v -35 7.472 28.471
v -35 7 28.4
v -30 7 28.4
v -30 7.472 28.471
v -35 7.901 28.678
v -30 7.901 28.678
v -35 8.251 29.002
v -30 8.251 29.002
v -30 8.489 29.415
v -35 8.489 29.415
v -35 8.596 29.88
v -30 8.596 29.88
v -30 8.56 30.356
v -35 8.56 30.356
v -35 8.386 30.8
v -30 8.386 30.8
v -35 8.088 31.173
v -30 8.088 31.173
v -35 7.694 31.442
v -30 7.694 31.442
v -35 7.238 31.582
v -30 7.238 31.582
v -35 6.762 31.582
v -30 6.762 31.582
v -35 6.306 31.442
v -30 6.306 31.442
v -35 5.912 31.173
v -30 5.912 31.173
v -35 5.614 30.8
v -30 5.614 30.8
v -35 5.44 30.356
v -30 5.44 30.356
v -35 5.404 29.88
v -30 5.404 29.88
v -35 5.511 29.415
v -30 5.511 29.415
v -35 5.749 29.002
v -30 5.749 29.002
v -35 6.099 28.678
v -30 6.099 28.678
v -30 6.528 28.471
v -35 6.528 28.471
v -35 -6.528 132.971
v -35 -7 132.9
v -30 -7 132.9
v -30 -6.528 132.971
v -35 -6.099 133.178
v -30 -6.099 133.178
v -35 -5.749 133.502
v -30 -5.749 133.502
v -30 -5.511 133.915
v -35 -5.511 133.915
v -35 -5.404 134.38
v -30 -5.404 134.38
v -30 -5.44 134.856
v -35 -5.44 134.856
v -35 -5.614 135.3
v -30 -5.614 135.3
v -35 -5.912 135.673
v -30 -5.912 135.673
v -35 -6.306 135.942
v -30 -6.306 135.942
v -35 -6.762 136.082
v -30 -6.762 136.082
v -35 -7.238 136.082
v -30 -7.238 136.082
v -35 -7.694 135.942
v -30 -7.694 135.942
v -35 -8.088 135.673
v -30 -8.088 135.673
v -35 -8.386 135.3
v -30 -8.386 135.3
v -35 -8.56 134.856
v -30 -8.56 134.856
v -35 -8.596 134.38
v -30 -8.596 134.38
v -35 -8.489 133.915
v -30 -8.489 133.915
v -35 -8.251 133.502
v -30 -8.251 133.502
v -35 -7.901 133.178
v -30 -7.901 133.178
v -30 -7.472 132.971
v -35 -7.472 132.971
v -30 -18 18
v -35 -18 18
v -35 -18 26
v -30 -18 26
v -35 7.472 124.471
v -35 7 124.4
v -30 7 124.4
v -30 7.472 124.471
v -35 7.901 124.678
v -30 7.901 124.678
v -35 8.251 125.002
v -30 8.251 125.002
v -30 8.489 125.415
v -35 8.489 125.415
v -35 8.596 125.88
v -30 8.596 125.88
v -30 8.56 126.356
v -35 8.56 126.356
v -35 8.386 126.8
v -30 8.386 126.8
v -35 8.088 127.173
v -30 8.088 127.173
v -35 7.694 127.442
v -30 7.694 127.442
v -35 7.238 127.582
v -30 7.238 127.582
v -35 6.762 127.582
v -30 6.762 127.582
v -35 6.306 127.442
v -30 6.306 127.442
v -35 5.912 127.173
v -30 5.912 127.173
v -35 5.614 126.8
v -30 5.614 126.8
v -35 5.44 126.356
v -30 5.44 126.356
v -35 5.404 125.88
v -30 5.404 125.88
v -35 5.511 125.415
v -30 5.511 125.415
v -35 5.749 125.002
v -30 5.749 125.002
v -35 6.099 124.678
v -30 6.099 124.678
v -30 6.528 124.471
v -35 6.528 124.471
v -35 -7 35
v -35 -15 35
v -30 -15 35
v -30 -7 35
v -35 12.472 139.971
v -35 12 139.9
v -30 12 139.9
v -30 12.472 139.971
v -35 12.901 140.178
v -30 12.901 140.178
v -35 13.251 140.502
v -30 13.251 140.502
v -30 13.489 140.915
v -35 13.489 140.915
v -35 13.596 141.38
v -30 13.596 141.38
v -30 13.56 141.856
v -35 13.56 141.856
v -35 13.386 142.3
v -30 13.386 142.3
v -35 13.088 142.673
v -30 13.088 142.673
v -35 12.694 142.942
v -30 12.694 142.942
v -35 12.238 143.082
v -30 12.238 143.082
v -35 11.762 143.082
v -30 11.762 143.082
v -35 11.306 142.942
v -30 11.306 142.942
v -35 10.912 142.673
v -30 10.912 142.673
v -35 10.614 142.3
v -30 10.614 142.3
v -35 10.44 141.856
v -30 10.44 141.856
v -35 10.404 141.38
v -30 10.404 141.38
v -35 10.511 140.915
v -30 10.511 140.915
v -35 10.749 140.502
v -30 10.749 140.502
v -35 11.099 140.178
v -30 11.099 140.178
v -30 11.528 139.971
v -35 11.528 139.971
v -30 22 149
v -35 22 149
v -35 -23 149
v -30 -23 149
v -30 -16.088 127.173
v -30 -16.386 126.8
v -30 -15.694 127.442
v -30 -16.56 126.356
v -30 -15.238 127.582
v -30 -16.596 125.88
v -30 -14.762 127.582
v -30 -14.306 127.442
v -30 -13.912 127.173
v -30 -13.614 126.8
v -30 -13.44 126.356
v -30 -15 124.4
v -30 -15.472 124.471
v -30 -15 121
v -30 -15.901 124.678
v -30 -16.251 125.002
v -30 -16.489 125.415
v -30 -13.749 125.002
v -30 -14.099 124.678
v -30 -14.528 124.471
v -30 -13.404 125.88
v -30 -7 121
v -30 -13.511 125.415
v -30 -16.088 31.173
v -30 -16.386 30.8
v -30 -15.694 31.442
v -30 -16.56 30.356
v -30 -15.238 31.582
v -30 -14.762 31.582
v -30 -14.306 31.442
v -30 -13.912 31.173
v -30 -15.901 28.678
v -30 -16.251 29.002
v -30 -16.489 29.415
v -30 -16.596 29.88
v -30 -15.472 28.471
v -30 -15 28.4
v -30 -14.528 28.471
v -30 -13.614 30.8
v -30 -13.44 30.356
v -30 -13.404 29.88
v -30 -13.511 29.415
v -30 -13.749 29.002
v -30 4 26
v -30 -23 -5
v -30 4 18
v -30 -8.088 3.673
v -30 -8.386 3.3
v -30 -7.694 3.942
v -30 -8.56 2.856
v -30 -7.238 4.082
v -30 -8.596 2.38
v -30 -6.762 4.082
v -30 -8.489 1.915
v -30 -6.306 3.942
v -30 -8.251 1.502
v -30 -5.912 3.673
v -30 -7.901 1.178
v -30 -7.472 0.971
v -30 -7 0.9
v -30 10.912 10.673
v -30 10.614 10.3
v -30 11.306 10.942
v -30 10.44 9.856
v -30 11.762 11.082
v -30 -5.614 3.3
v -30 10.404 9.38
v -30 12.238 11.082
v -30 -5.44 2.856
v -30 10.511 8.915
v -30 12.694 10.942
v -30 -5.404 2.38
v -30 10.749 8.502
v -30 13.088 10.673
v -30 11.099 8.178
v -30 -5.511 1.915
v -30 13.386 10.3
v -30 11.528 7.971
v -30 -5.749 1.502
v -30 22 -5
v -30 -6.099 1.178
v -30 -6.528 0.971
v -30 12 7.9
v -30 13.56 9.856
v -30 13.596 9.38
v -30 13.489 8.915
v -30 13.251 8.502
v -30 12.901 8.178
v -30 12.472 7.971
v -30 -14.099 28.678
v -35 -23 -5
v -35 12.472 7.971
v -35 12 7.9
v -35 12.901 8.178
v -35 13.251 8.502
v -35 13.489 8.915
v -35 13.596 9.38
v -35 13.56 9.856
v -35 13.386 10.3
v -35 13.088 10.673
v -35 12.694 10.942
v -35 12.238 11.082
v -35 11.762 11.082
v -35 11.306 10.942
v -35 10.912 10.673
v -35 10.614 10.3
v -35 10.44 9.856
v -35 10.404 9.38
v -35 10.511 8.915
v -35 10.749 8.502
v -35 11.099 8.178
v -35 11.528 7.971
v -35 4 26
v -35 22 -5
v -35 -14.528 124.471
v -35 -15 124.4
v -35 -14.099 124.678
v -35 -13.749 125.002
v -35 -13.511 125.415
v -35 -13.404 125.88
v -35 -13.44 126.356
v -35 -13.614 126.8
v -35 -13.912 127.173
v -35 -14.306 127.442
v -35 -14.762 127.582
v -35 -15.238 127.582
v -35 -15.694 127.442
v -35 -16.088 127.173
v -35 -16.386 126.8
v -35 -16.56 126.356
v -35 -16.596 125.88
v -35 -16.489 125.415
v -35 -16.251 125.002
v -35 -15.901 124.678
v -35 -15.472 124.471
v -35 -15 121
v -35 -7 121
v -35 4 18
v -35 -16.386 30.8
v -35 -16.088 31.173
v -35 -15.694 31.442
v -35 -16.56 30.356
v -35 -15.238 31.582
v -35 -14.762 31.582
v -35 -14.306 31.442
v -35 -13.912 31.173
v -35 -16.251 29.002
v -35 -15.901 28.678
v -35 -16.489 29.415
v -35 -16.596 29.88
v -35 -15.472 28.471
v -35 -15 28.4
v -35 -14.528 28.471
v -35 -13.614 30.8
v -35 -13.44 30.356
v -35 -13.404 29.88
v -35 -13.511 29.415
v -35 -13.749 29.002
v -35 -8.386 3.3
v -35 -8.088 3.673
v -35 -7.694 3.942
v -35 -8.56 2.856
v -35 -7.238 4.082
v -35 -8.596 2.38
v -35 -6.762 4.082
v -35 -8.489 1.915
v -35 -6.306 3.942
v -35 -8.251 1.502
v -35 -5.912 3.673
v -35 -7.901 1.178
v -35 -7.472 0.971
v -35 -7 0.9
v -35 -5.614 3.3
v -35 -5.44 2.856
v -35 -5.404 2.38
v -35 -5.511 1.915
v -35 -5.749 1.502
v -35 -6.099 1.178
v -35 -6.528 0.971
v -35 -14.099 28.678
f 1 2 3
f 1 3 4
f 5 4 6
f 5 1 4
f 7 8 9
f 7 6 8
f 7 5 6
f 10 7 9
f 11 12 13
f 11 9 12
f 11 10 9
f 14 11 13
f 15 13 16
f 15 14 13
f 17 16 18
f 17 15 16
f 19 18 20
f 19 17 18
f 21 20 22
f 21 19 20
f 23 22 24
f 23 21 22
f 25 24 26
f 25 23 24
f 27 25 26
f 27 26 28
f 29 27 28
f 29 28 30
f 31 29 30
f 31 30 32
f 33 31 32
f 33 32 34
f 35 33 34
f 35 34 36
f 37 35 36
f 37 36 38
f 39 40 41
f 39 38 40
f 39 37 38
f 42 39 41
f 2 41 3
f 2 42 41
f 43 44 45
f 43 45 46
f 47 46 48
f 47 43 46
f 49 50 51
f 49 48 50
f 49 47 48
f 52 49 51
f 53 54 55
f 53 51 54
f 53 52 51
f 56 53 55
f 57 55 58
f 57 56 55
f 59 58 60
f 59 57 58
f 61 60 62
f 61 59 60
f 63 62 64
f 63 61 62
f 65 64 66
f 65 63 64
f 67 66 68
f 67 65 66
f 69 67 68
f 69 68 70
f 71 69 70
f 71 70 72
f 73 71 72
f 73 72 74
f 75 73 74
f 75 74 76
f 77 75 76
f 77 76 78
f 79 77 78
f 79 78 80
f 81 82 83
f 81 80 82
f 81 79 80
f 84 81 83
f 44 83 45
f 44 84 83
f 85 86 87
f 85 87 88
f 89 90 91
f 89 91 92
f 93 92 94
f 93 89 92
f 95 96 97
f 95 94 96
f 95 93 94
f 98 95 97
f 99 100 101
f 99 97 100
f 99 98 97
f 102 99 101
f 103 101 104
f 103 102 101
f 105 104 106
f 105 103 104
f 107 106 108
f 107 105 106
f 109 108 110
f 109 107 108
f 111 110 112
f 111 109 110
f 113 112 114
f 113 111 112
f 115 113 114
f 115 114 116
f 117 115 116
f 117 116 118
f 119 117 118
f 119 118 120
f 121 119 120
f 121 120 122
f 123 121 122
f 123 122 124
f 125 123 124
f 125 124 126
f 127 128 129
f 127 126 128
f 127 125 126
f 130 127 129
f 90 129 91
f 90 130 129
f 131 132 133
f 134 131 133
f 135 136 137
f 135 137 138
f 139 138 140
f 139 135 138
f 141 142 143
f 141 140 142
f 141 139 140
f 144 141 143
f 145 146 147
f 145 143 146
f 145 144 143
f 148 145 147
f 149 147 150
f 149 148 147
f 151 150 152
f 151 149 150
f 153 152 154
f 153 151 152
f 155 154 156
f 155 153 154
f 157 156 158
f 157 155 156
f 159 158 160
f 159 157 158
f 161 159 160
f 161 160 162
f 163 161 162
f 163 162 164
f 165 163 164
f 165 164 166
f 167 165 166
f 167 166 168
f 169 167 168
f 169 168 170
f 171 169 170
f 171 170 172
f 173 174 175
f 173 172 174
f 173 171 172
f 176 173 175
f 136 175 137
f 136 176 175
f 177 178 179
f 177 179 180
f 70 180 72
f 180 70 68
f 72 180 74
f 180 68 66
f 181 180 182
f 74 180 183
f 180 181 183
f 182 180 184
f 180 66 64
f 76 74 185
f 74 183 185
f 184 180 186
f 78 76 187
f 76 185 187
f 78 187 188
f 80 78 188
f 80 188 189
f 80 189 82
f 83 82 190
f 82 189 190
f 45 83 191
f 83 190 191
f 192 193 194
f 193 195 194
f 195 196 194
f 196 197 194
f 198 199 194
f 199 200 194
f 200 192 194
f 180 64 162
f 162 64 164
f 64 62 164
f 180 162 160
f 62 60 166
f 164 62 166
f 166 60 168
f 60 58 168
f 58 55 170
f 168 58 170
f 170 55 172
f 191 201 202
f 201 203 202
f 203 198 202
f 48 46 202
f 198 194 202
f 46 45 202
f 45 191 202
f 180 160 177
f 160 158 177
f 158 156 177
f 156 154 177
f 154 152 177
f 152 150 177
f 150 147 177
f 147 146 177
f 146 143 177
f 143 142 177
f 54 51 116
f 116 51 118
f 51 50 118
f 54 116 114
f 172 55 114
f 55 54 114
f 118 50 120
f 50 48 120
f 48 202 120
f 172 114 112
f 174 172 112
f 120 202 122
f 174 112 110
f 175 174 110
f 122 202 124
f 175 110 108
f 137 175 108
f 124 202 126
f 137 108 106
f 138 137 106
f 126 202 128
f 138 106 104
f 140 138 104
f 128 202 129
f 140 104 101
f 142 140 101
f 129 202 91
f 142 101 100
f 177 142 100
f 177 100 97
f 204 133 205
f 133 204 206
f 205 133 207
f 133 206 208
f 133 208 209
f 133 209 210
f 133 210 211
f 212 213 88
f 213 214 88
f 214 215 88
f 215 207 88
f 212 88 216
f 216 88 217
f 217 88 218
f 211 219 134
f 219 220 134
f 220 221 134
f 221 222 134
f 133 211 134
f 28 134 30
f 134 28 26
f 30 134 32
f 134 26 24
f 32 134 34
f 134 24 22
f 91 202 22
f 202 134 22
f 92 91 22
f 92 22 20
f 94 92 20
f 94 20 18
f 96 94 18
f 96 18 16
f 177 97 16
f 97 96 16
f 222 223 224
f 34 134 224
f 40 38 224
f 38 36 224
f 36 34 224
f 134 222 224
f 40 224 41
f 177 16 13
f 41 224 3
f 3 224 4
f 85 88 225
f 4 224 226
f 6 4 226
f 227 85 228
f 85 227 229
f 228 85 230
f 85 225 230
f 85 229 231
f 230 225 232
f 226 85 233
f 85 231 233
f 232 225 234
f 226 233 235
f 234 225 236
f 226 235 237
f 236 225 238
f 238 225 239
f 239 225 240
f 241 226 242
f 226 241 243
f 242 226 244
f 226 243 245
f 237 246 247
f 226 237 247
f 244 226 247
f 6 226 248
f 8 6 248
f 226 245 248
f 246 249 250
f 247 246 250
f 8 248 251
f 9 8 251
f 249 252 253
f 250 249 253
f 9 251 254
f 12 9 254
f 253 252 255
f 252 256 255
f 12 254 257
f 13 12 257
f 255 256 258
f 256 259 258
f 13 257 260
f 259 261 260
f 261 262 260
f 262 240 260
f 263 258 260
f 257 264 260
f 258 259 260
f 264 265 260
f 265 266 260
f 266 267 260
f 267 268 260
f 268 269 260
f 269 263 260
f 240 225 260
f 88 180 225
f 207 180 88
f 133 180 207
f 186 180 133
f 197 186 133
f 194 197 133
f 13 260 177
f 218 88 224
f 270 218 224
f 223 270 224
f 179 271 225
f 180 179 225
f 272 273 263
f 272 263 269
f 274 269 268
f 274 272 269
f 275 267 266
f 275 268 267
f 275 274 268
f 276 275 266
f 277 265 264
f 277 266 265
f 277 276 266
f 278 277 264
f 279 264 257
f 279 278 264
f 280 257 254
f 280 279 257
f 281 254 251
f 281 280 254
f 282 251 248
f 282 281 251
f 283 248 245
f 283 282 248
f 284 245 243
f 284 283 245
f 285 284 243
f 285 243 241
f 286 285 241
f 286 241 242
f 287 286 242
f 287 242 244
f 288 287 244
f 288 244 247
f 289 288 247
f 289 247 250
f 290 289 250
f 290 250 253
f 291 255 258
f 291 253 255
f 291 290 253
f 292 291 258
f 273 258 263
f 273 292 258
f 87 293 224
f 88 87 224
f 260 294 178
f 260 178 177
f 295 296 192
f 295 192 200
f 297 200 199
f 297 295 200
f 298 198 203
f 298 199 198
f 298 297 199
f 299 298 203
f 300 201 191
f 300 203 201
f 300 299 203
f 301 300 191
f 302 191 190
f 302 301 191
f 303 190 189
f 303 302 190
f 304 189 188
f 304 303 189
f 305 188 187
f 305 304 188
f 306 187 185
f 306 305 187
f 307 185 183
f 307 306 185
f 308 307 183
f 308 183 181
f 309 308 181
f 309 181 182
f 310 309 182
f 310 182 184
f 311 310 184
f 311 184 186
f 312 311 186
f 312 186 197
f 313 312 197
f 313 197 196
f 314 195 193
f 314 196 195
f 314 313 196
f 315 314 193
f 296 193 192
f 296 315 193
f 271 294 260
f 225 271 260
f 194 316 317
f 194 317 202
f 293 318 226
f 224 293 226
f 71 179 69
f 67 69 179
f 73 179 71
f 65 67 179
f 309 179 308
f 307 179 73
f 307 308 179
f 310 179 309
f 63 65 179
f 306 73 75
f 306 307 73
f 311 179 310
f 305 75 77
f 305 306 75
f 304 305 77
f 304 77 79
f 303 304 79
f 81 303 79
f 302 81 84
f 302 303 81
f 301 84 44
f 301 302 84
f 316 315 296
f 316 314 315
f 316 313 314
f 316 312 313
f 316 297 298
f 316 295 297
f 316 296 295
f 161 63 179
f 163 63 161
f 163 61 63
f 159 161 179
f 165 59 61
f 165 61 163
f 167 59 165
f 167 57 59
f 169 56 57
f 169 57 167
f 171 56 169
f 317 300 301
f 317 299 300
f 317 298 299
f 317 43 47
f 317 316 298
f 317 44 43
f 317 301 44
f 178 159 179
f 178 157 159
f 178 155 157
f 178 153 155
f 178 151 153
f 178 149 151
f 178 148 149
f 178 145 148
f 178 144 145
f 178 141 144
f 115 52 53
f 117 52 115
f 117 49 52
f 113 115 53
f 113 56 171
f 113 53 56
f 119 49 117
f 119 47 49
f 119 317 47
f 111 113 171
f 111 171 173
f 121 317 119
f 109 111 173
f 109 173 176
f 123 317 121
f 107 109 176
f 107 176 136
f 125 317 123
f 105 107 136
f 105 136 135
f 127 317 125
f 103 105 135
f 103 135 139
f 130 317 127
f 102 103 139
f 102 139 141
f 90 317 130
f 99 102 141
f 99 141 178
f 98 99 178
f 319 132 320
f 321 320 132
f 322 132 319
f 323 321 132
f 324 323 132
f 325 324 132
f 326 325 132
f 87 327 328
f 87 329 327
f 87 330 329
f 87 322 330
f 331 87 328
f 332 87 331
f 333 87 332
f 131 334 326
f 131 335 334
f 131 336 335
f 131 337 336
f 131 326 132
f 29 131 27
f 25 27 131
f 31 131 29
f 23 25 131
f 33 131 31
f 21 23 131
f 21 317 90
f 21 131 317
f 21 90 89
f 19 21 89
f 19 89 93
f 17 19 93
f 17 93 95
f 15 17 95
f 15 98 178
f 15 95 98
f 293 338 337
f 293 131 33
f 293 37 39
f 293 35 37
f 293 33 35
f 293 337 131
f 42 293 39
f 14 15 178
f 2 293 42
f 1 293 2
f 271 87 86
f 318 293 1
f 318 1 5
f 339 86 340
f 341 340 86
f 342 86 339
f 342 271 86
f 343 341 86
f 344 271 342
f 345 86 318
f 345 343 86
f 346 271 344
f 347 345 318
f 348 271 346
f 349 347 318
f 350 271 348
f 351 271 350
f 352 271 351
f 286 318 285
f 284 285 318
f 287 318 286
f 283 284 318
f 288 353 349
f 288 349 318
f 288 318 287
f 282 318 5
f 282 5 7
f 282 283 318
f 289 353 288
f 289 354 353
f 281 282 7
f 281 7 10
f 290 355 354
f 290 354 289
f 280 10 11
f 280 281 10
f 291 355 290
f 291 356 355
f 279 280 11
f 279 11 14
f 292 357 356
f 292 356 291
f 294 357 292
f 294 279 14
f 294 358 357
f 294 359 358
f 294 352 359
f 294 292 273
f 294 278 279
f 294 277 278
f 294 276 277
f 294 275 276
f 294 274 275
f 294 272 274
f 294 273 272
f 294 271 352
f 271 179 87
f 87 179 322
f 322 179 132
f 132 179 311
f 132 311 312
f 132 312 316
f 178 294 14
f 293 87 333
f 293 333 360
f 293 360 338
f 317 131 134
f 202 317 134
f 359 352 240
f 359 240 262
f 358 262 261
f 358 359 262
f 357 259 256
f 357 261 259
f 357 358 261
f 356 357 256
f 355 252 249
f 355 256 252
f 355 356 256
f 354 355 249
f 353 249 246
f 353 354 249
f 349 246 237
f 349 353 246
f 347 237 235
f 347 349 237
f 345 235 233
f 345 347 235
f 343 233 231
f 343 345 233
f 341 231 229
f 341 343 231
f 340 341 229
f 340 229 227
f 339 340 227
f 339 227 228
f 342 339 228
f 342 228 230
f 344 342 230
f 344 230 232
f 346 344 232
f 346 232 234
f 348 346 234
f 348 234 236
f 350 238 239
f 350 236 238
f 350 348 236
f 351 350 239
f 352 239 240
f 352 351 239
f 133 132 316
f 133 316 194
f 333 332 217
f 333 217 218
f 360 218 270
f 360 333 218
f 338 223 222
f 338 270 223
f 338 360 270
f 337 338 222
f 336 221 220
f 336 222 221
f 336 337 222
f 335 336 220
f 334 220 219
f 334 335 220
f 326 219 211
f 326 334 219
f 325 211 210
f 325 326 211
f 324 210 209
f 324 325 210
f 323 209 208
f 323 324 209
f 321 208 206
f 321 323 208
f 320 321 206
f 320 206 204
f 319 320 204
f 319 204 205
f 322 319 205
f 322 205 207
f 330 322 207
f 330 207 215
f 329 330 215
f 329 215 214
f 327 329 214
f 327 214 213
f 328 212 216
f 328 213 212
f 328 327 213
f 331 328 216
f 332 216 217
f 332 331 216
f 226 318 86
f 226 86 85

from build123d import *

# Parameters (mm, degrees)
CYLINDER081_R           = 1.6
CYLINDER081_DEPTH       = 40
CYLINDER081_PITCH_ANGLE = 90
CYLINDER077_R           = 1.6
CYLINDER077_DEPTH       = 40
CYLINDER077_PITCH_ANGLE = 90
CYLINDER076_R           = 1.6
CYLINDER076_DEPTH       = 40
CYLINDER076_PITCH_ANGLE = 90
CYLINDER080_R           = 1.6
CYLINDER080_DEPTH       = 40
CYLINDER080_PITCH_ANGLE = 90
CYLINDER079_R           = 1.6
CYLINDER079_DEPTH       = 40
CYLINDER079_PITCH_ANGLE = 90
CYLINDER078_R           = 1.6
CYLINDER078_DEPTH       = 40
CYLINDER078_PITCH_ANGLE = 90
BOX028_W                = 10
BOX028_H                = 22
BOX028_DEPTH            = 8
CYLINDER019_R           = 1.6
CYLINDER019_DEPTH       = 40
CYLINDER019_PITCH_ANGLE = 90
CYLINDER018_R           = 1.6
CYLINDER018_DEPTH       = 40
CYLINDER018_PITCH_ANGLE = 90
CYLINDER017_R           = 1.6
CYLINDER017_DEPTH       = 40
CYLINDER016_R           = 1.6
CYLINDER016_DEPTH       = 70
CYLINDER016_ROLL_ANGLE  = 90
CYLINDER015_R           = 1.6
CYLINDER015_DEPTH       = 40
BOX016_W                = 10
BOX016_H                = 8
BOX016_DEPTH            = 86
BOX014_W                = 5
BOX014_H                = 45
BOX014_DEPTH            = 154


with BuildPart() as cylinder359:
    # Cylinder081 → Cylinder081 (new body)
    with BuildSketch(Plane.XY):
        Circle(CYLINDER081_R)
    extrude(amount=CYLINDER081_DEPTH)


with BuildPart() as cylinder359_1:
    # Cylinder081 pitch: moved
    add(cylinder359.part.rotate(Axis((0, 0, 0), (0, 1, 0)), CYLINDER081_PITCH_ANGLE))


with BuildPart() as cylinder359_2:
    # Cylinder081 placement: moved
    add(cylinder359_1.part.moved(Location((-67, 7, 126))))


with BuildPart() as cylinder355:
    # Cylinder077 → Cylinder077 (new body)
    with BuildSketch(Plane.XY):
        Circle(CYLINDER077_R)
    extrude(amount=CYLINDER077_DEPTH)


with BuildPart() as cylinder355_1:
    # Cylinder077 pitch: moved
    add(cylinder355.part.rotate(Axis((0, 0, 0), (0, 1, 0)), CYLINDER077_PITCH_ANGLE))


with BuildPart() as cylinder355_2:
    # Cylinder077 placement: moved
    add(cylinder355_1.part.moved(Location((-67, -15, 30))))


with BuildPart() as rocker_screw_holes_d001:
    # Cylinder076 → Cylinder076 (new body)
    with BuildSketch(Plane.XY):
        Circle(CYLINDER076_R)
    extrude(amount=CYLINDER076_DEPTH)


with BuildPart() as rocker_screw_holes_d001_1:
    # Cylinder076 pitch: moved
    add(rocker_screw_holes_d001.part.rotate(Axis((0, 0, 0), (0, 1, 0)), CYLINDER076_PITCH_ANGLE))


with BuildPart() as rocker_screw_holes_d001_2:
    # Cylinder076 placement: moved
    add(rocker_screw_holes_d001_1.part.moved(Location((-87, -7, 30))))

    # Fusion051: union Cylinder355
    add(cylinder355_2.part)


with BuildPart() as rocker_screw_holes_d001_3:
    # Fusion051 placement: moved
    add(rocker_screw_holes_d001_2.part.moved(Location((0, 0, 96))))

    # Fusion054: union Cylinder359
    add(cylinder359_2.part)


with BuildPart() as cylinder358:
    # Cylinder080 → Cylinder080 (new body)
    with BuildSketch(Plane.XY):
        Circle(CYLINDER080_R)
    extrude(amount=CYLINDER080_DEPTH)


with BuildPart() as cylinder358_1:
    # Cylinder080 pitch: moved
    add(cylinder358.part.rotate(Axis((0, 0, 0), (0, 1, 0)), CYLINDER080_PITCH_ANGLE))


with BuildPart() as cylinder358_2:
    # Cylinder080 placement: moved
    add(cylinder358_1.part.moved(Location((-67, 7, 30))))


with BuildPart() as cylinder357:
    # Cylinder079 → Cylinder079 (new body)
    with BuildSketch(Plane.XY):
        Circle(CYLINDER079_R)
    extrude(amount=CYLINDER079_DEPTH)


with BuildPart() as cylinder357_1:
    # Cylinder079 pitch: moved
    add(cylinder357.part.rotate(Axis((0, 0, 0), (0, 1, 0)), CYLINDER079_PITCH_ANGLE))


with BuildPart() as cylinder357_2:
    # Cylinder079 placement: moved
    add(cylinder357_1.part.moved(Location((-67, -15, 30))))


with BuildPart() as rocker_screw_holes_c001:
    # Cylinder078 → Cylinder078 (new body)
    with BuildSketch(Plane.XY):
        Circle(CYLINDER078_R)
    extrude(amount=CYLINDER078_DEPTH)


with BuildPart() as rocker_screw_holes_c001_1:
    # Cylinder078 pitch: moved
    add(rocker_screw_holes_c001.part.rotate(Axis((0, 0, 0), (0, 1, 0)), CYLINDER078_PITCH_ANGLE))


with BuildPart() as rocker_screw_holes_c001_2:
    # Cylinder078 placement: moved
    add(rocker_screw_holes_c001_1.part.moved(Location((-87, -7, 30))))

    # Fusion052: union Cylinder357
    add(cylinder357_2.part)

    # Fusion053: union Cylinder358
    add(cylinder358_2.part)


with BuildPart() as cube016:
    # Box028 → Box028 (new body)
    with BuildSketch(Plane(origin=(-37, -18, 18), x_dir=(1, 0, 0), z_dir=(0, 0, 1))):
        with Locations((5, 11)):
            Rectangle(BOX028_W, BOX028_H)
    extrude(amount=BOX028_DEPTH)


with BuildPart() as cylinder100:
    # Cylinder019 → Cylinder019 (new body)
    with BuildSketch(Plane.XY):
        Circle(CYLINDER019_R)
    extrude(amount=CYLINDER019_DEPTH)


with BuildPart() as cylinder100_1:
    # Cylinder019 pitch: moved
    add(cylinder100.part.rotate(Axis((0, 0, 0), (0, 1, 0)), CYLINDER019_PITCH_ANGLE))


with BuildPart() as cylinder100_2:
    # Cylinder019 placement: moved
    add(cylinder100_1.part.moved(Location((-40, 12, 9.5))))


with BuildPart() as fusion011:
    # Cylinder018 → Cylinder018 (new body)
    with BuildSketch(Plane.XY):
        Circle(CYLINDER018_R)
    extrude(amount=CYLINDER018_DEPTH)


with BuildPart() as fusion011_1:
    # Cylinder018 pitch: moved
    add(fusion011.part.rotate(Axis((0, 0, 0), (0, 1, 0)), CYLINDER018_PITCH_ANGLE))


with BuildPart() as fusion011_2:
    # Cylinder018 placement: moved
    add(fusion011_1.part.moved(Location((-40, -7, 2.5))))

    # Fusion011: union Cylinder100
    add(cylinder100_2.part)


with BuildPart() as fusion012:
    # Cylinder017 → Cylinder017 (new body)
    with BuildSketch(Plane(origin=(-27.5, 7, -15), x_dir=(1, 0, 0), z_dir=(0, 0, 1))):
        Circle(CYLINDER017_R)
    extrude(amount=CYLINDER017_DEPTH)

    # Fusion012: union Fusion011
    add(fusion011_2.part)


with BuildPart() as fusion013:
    # Cylinder016 → Cylinder016 (new body)
    with BuildSketch(Plane.XY):
        Circle(CYLINDER016_R)
    extrude(amount=CYLINDER016_DEPTH)


with BuildPart() as fusion013_1:
    # Cylinder016 roll: moved
    add(fusion013.part.rotate(Axis((0, 0, 0), (1, 0, 0)), CYLINDER016_ROLL_ANGLE))


with BuildPart() as fusion013_2:
    # Cylinder016 placement: moved
    add(fusion013_1.part.moved(Location((-24, 39, 6))))

    # Fusion013: union Fusion012
    add(fusion012.part)


with BuildPart() as cylinder008:
    # Cylinder015 → Cylinder015 (new body)
    with BuildSketch(Plane(origin=(-20.5, -12, -15), x_dir=(1, 0, 0), z_dir=(0, 0, 1))):
        Circle(CYLINDER015_R)
    extrude(amount=CYLINDER015_DEPTH)


with BuildPart() as face_corner_holes010:
    # Fusion024 base: copy of Cylinder008
    add(cylinder008.part)

    # Fusion024: union Fusion013
    add(fusion013_2.part)


with BuildPart() as face_corner_holes010_1:
    # Fusion024 placement: moved
    add(face_corner_holes010.part.moved(Location((0, 0, 132))))


with BuildPart() as face_corner_holes:
    # Fusion014 base: copy of Cylinder008
    add(cylinder008.part)

    # Fusion014: union Fusion013
    add(fusion013_2.part)


with BuildPart() as string_hole:
    # Box016 → Box016 (new body)
    with BuildSketch(Plane(origin=(-36, -15, 35), x_dir=(1, 0, 0), z_dir=(0, 0, 1))):
        with Locations((5, 4)):
            Rectangle(BOX016_W, BOX016_H)
    extrude(amount=BOX016_DEPTH)


with BuildPart() as bottom_a:
    # Box014 → Box014 (new body)
    with BuildSketch(Plane(origin=(-35, -23, -5), x_dir=(1, 0, 0), z_dir=(0, 0, 1))):
        with Locations((2.5, 22.5)):
            Rectangle(BOX014_W, BOX014_H)
    extrude(amount=BOX014_DEPTH)

    # Cut007: cut string-hole
    add(string_hole.part, mode=Mode.SUBTRACT)

    # Cut012: cut face-corner-holes
    add(face_corner_holes.part, mode=Mode.SUBTRACT)

    # Cut021: cut face-corner-holes010
    add(face_corner_holes010_1.part, mode=Mode.SUBTRACT)

    # Cut034: cut Cube016
    add(cube016.part, mode=Mode.SUBTRACT)

    # Cut043: cut rocker-screw-holes-c001
    add(rocker_screw_holes_c001_2.part, mode=Mode.SUBTRACT)

    # Cut044: cut rocker-screw-holes-d001
    add(rocker_screw_holes_d001_3.part, mode=Mode.SUBTRACT)


solid = bottom_a.part
